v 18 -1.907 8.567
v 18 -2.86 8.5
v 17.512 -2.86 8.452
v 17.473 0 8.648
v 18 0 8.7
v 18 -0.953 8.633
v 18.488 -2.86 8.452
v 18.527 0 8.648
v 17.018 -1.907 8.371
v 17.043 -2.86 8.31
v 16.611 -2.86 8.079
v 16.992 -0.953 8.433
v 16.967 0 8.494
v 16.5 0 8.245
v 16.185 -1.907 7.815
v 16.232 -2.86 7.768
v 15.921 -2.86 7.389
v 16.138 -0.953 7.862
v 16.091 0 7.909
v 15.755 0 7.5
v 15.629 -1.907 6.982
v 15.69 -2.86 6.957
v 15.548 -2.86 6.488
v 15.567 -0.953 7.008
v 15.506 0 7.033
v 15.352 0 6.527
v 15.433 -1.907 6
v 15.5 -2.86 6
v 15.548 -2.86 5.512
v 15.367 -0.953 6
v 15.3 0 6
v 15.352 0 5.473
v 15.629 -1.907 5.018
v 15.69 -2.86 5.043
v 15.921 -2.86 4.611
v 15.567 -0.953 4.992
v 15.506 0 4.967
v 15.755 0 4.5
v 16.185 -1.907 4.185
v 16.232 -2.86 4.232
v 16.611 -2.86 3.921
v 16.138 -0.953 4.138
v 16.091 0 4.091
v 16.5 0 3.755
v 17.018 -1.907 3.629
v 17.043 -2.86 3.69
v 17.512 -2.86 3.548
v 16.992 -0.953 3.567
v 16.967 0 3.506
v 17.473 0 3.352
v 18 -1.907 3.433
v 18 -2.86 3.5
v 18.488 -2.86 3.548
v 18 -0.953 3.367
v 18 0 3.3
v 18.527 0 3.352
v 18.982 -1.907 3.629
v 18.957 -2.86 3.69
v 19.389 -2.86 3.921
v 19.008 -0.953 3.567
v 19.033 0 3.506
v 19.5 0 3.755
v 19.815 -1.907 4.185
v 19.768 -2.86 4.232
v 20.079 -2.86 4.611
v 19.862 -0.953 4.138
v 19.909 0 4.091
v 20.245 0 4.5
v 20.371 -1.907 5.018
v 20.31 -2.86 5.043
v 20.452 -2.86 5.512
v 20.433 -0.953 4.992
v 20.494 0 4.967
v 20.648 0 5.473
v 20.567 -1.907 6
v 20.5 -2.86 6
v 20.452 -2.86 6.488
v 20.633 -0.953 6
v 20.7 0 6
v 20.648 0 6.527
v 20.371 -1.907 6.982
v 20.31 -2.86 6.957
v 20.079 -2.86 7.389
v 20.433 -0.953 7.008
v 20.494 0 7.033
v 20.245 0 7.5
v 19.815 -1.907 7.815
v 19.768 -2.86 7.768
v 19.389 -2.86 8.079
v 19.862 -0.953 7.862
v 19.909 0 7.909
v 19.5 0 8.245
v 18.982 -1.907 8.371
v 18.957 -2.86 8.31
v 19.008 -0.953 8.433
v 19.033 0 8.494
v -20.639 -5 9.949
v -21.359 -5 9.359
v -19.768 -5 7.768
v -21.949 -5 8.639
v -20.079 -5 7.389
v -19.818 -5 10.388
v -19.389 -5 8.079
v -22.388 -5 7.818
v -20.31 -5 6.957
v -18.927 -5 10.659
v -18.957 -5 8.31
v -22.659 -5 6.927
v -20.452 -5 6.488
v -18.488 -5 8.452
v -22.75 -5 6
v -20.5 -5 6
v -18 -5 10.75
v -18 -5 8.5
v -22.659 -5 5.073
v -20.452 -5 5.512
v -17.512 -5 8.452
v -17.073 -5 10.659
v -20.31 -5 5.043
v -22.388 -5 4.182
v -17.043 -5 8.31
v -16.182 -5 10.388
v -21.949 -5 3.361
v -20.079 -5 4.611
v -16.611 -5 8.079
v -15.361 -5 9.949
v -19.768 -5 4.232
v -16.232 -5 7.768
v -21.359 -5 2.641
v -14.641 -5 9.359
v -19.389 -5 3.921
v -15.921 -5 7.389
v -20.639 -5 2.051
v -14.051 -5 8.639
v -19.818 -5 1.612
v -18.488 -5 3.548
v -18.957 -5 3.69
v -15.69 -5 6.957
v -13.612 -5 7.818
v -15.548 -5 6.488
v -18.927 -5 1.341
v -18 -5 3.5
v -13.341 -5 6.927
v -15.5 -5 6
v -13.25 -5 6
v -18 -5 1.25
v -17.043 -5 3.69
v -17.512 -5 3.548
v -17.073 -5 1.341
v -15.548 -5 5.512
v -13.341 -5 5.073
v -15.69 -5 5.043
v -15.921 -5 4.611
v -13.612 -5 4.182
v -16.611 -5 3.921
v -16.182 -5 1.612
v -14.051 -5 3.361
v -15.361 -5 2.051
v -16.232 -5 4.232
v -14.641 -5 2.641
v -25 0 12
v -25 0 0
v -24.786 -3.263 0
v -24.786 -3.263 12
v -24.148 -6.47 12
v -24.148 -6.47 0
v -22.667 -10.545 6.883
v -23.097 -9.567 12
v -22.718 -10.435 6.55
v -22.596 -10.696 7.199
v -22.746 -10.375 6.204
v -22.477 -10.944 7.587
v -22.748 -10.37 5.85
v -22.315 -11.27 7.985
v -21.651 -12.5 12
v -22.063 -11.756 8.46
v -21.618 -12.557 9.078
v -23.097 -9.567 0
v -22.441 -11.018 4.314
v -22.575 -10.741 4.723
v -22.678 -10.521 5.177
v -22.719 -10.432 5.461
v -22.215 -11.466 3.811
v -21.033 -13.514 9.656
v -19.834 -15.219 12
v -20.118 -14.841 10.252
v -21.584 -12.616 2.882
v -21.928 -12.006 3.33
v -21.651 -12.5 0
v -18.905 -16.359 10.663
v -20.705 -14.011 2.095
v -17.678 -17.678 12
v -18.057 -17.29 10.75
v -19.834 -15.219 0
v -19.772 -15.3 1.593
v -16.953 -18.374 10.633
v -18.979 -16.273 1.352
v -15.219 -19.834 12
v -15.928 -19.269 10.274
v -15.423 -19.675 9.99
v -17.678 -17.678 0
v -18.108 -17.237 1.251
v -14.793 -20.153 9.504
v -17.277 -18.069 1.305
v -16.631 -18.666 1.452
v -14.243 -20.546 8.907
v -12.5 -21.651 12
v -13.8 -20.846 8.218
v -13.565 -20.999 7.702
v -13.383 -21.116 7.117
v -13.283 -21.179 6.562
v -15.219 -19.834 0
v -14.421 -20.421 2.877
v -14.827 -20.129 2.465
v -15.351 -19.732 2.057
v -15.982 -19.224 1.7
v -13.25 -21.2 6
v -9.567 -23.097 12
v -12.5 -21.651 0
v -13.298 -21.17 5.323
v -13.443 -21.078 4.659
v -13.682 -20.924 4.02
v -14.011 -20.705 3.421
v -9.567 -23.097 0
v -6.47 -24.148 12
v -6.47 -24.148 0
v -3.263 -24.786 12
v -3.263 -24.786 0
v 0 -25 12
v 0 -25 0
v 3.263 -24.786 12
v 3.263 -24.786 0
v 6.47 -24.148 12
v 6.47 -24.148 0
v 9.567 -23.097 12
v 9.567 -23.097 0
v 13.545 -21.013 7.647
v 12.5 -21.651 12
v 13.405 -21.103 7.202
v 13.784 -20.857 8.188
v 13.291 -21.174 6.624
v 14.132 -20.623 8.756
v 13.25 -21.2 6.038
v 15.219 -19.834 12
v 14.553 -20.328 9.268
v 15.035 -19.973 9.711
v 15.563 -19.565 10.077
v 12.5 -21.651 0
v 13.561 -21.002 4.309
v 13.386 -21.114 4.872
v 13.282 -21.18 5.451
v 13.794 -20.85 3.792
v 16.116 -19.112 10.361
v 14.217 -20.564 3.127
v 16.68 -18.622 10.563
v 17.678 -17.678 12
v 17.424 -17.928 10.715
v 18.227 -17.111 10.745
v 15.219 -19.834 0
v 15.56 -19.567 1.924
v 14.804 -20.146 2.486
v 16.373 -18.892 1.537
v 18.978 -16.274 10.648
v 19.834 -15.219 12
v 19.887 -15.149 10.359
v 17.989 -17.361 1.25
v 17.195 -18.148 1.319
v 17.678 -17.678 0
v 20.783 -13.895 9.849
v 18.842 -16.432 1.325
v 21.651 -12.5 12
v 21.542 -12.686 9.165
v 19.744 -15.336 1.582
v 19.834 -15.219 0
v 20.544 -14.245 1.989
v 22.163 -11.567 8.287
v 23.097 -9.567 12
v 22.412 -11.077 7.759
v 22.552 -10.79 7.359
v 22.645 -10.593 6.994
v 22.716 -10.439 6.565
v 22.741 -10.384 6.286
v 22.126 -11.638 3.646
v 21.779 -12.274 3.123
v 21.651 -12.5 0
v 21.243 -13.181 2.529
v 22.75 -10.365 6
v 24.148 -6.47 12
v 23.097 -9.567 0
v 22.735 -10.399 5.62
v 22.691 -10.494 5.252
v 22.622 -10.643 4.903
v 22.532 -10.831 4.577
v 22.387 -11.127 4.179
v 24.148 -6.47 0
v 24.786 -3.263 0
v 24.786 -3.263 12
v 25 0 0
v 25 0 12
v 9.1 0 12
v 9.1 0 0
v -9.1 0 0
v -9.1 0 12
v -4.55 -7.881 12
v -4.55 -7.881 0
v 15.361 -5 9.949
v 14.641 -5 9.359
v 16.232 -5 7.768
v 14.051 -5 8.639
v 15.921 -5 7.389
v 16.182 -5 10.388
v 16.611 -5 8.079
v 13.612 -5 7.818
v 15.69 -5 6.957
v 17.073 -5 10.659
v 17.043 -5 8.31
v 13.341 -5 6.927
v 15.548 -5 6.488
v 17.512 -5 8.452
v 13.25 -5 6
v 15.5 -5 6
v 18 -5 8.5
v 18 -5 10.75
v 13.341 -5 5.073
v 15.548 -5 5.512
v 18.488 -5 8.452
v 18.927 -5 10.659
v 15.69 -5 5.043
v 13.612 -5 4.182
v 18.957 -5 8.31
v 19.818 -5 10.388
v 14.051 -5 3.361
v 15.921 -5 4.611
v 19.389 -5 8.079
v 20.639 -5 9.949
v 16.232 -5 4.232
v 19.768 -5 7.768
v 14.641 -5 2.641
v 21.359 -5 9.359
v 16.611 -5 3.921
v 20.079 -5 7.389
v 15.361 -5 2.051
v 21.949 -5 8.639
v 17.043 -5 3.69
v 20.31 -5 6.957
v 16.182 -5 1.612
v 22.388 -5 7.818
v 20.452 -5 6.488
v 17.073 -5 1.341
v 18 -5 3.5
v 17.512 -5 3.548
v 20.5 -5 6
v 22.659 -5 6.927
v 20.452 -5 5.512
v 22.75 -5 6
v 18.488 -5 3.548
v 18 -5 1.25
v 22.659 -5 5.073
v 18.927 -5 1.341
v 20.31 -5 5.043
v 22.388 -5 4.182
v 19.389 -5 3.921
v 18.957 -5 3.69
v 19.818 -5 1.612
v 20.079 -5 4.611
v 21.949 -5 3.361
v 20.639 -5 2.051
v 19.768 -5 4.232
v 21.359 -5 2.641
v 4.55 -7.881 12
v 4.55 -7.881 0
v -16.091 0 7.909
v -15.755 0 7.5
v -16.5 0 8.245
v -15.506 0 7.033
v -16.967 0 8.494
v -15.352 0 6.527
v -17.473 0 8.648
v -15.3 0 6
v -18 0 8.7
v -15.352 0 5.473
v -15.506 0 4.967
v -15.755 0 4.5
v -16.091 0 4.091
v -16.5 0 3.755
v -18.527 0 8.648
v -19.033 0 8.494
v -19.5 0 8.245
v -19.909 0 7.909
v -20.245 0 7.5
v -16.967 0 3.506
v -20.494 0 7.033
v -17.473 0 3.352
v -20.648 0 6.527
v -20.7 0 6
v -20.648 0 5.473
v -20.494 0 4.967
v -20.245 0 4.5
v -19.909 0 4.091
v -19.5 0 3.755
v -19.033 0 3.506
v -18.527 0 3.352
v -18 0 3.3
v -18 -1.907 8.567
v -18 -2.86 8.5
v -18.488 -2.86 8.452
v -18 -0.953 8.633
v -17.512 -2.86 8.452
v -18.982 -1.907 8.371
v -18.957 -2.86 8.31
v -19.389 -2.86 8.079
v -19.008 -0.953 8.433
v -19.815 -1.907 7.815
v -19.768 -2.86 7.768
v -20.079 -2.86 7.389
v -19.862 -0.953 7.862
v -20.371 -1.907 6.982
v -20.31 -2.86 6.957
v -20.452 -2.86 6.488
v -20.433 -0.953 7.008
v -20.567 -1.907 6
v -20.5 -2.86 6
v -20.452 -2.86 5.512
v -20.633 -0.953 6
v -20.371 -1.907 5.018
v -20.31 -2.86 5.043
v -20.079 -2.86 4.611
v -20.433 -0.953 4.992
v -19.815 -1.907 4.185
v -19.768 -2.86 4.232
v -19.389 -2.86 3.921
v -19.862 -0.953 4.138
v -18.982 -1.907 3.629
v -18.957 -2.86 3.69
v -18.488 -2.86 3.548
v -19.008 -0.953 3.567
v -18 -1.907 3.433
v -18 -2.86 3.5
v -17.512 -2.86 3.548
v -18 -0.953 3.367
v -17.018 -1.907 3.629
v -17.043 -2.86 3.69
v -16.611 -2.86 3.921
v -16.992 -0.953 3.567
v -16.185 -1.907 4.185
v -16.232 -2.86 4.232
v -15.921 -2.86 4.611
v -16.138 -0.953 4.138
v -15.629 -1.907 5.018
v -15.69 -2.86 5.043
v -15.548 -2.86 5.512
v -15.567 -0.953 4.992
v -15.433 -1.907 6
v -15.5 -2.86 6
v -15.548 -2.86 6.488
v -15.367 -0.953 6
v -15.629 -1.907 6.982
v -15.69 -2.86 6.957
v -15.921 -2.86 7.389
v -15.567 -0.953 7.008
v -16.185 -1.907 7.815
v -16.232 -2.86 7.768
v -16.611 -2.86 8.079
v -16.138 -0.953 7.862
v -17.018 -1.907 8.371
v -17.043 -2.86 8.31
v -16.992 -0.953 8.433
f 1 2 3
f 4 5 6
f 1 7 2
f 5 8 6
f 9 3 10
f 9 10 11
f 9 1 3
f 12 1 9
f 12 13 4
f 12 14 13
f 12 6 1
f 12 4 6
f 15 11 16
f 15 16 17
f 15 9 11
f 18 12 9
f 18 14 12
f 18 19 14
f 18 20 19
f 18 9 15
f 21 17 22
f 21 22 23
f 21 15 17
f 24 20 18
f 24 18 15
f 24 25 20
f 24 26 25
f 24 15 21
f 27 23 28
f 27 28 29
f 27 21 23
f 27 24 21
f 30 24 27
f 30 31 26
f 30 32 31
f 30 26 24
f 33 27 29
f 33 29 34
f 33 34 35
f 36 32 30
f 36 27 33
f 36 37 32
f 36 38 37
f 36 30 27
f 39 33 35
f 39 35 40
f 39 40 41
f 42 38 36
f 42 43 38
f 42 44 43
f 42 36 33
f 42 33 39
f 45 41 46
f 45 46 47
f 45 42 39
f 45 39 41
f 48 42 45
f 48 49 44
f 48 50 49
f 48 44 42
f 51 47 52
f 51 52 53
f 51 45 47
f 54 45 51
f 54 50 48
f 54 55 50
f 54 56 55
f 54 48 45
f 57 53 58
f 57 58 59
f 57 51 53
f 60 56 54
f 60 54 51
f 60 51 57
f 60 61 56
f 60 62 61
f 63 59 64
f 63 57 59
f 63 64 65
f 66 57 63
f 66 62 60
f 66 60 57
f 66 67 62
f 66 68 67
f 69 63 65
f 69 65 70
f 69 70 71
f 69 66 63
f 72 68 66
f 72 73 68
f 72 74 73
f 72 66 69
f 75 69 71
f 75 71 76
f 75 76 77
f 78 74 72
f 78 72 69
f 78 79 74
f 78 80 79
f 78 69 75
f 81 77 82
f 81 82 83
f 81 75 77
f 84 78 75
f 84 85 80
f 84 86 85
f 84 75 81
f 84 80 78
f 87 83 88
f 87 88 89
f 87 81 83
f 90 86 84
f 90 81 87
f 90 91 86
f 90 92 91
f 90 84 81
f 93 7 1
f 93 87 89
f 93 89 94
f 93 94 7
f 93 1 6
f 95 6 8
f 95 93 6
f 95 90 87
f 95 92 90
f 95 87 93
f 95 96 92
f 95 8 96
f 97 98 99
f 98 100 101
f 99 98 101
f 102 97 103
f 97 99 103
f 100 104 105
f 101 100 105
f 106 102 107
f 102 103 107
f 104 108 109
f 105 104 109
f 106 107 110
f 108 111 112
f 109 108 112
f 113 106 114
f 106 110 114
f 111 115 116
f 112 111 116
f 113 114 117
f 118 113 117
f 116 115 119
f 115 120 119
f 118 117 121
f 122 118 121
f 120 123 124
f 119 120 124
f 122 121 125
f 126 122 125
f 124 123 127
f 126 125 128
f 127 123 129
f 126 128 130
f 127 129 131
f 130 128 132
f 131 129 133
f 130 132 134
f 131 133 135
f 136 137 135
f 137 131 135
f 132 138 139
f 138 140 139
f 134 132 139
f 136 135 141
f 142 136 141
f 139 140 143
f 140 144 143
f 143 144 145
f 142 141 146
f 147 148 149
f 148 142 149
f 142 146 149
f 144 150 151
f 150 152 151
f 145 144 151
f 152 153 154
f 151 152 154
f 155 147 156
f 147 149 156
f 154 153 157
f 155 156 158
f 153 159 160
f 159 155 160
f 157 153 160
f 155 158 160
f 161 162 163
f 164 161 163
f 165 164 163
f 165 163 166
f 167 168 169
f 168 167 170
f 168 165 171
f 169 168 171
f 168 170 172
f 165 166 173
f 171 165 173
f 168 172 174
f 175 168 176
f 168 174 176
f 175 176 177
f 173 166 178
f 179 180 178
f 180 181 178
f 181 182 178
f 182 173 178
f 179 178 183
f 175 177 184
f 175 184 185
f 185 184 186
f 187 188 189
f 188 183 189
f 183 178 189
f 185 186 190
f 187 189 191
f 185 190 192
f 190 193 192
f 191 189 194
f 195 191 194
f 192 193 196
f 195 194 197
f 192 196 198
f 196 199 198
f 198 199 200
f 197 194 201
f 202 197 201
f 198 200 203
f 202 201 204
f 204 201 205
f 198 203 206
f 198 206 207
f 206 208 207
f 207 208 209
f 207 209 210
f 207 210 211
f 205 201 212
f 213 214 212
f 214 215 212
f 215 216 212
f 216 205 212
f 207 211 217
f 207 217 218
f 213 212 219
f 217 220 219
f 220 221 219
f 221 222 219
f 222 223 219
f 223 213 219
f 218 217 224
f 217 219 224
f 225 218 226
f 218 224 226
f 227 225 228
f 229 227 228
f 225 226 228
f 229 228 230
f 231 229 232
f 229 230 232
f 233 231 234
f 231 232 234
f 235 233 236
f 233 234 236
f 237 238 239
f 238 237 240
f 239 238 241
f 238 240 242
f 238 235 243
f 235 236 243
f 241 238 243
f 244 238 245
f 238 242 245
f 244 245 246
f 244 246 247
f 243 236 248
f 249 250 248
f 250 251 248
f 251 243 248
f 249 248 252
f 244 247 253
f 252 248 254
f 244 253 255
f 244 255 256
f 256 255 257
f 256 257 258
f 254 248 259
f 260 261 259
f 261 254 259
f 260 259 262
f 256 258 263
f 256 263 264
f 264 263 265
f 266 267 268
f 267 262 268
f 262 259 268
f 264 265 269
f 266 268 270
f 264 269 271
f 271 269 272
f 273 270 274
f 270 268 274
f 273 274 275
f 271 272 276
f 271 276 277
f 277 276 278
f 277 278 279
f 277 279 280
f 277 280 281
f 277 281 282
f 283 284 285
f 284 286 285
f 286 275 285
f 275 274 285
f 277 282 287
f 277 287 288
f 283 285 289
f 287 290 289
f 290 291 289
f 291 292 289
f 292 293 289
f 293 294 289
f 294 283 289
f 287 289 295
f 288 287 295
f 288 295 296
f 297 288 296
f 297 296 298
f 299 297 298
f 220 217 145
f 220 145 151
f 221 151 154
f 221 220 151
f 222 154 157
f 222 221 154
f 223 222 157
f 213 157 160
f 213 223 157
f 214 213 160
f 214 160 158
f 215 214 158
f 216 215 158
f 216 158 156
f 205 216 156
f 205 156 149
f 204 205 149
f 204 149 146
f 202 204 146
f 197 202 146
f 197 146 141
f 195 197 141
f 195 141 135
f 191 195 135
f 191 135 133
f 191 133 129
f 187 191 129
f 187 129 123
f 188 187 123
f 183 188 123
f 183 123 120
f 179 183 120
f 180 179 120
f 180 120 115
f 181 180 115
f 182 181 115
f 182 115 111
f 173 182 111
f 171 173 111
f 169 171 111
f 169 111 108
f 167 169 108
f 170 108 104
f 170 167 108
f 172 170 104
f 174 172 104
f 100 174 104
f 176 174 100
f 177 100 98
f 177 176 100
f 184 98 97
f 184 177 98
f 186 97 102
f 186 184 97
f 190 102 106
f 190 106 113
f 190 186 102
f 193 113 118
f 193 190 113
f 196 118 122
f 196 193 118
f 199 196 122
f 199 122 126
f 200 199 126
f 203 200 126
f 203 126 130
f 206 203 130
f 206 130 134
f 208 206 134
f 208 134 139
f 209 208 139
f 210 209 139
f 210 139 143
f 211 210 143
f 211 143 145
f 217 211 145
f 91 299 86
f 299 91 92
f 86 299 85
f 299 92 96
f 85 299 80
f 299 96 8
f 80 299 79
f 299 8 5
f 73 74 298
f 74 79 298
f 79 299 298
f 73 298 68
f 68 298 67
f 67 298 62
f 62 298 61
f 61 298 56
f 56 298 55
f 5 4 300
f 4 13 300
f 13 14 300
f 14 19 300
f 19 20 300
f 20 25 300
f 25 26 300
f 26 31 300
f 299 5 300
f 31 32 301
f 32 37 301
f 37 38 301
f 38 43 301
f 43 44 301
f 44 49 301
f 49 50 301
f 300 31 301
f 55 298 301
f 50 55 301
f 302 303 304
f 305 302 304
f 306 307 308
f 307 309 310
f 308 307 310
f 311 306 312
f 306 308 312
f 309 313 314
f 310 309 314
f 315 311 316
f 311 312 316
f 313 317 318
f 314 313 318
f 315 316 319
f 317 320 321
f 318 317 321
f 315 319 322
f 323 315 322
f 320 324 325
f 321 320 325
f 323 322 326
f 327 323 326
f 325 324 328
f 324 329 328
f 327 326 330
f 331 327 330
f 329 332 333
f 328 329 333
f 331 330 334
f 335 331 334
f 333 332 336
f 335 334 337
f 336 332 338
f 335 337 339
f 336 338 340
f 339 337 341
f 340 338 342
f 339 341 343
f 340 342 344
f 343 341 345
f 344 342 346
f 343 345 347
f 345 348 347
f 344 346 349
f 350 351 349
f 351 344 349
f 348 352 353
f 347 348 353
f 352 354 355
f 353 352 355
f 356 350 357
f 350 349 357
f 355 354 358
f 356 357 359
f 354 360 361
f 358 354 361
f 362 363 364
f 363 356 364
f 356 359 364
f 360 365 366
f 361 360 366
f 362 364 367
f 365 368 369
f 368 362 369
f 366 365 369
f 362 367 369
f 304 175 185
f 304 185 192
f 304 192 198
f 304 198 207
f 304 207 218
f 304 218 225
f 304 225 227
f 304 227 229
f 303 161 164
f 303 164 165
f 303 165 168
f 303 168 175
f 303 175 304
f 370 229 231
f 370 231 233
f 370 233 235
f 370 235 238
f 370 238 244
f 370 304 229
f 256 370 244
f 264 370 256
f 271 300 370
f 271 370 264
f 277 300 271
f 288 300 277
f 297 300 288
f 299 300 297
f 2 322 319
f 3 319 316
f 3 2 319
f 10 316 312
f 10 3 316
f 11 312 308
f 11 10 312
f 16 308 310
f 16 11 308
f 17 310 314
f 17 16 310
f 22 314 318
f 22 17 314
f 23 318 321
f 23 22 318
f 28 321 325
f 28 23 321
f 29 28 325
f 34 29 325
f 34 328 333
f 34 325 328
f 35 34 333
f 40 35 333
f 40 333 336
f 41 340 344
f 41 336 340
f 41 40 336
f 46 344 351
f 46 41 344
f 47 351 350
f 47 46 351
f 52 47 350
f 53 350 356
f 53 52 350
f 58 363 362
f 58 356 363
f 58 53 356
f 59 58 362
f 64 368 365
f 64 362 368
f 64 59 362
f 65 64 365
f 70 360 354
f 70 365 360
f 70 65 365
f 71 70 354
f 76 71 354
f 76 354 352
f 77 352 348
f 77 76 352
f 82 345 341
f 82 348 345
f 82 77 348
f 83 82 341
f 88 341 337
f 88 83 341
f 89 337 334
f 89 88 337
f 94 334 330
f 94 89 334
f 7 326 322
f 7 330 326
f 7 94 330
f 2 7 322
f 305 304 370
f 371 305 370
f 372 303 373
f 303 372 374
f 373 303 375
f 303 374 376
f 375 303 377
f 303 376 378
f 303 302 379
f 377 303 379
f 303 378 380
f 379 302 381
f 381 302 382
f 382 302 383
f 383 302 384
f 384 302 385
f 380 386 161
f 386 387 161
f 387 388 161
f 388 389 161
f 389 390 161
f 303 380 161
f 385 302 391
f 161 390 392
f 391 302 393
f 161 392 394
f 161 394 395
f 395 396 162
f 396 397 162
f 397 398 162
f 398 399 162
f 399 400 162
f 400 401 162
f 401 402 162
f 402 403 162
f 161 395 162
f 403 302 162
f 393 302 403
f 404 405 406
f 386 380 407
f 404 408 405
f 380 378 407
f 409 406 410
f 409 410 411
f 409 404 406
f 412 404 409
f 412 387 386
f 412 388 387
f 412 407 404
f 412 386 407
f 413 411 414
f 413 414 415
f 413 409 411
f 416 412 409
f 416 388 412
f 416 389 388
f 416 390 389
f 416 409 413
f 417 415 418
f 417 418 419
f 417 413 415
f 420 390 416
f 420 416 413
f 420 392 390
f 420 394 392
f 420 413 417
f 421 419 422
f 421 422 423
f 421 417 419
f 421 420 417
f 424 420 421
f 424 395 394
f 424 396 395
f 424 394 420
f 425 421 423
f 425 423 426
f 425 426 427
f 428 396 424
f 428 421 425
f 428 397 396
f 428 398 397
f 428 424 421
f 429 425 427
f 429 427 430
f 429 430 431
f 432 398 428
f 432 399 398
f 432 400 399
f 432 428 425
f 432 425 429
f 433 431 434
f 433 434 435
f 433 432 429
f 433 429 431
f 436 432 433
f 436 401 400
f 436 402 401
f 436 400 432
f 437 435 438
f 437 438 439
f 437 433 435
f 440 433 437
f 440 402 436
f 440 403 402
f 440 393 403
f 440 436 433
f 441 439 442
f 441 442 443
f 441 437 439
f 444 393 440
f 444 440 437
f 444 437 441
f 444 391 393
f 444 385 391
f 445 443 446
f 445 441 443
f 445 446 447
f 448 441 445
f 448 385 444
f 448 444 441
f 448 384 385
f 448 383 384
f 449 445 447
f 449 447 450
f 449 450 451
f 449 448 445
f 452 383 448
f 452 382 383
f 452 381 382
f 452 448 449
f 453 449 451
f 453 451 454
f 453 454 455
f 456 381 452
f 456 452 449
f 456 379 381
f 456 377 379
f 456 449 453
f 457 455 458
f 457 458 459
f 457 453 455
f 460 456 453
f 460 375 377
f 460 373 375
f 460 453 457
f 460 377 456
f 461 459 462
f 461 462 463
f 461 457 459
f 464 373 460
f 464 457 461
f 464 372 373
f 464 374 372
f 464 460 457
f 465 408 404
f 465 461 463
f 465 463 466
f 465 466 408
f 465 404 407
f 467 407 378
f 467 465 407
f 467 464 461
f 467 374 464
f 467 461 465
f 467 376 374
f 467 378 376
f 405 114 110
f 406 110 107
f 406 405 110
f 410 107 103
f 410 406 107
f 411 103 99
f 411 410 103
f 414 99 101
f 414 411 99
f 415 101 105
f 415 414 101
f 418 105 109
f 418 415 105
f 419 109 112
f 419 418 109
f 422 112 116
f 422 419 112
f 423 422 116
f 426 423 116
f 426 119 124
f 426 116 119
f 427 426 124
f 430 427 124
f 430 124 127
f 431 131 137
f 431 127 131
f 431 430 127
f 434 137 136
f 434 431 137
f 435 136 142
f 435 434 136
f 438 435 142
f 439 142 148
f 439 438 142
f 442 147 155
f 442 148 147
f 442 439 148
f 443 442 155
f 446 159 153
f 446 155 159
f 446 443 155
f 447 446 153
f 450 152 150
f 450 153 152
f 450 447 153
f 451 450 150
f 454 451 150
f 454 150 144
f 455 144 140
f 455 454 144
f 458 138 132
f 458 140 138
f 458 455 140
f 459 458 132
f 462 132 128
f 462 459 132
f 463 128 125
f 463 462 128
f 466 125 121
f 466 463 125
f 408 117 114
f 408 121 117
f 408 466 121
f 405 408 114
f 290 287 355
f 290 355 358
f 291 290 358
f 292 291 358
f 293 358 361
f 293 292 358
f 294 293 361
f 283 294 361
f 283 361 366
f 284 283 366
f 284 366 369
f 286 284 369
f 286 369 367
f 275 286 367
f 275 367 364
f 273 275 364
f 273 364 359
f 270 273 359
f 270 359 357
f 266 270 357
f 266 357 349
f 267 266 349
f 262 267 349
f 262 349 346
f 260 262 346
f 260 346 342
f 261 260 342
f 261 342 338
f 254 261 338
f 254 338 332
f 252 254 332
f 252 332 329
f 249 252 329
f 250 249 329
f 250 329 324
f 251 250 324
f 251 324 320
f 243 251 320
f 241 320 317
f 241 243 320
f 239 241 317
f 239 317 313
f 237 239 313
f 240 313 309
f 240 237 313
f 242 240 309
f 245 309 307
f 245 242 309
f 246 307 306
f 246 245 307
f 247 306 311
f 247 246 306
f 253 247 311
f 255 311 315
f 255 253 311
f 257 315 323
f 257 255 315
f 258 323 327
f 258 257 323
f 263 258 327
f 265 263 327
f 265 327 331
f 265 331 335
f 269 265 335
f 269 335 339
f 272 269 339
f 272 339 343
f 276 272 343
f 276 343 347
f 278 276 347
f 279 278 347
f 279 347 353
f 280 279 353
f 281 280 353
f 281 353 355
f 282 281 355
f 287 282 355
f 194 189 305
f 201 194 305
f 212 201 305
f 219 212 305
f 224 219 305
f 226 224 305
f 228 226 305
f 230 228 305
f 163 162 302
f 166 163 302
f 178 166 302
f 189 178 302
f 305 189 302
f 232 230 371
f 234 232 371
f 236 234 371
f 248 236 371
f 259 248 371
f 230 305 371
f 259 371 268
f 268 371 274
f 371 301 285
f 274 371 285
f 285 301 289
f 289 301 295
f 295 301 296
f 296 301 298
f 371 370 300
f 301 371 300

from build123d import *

# Parameters (mm, degrees)
BOSS_EXTRUDE1_DEPTH                          = 12
SKETCH2_R                                    = 4.75
CUT_EXTRUDE1_DEPTH                           = 35
SKETCH3_R                                    = 2.05
CUT_EXTRUDE2_DEPTH                           = 35
CUT_EXTRUDE3_DEPTH                           = 20
CSK_FOR_M3_CROSS_COUNTERSUNK_HEAD_SC_2_COUNT = 2
CSK_FOR_M3_CROSS_COUNTERSUNK_HEAD_SC_2_PITCH = 36


with BuildPart() as part:
    # Sketch1 → Boss-Extrude1 (new body)
    with BuildSketch(Plane.XY):
        with BuildLine():
            Line((-9.1, 0), (-25, 0))
            ThreePointArc((-25, 0), (0, -25), (25, 0))
            Line((25, 0), (9.211282306, 0))
            Line((9.211282306, 0), (9.1, 0))
            Line((9.1, 0), (-9.1, 0))
        make_face()
    extrude(amount=BOSS_EXTRUDE1_DEPTH)

    # Sketch2 → Cut-Extrude1 (cut)
    with BuildSketch(Plane(origin=(0, -40, 0), x_dir=(1, 0, 0), z_dir=(0, 1, 0))):
        with Locations((18, -6)):
            Circle(SKETCH2_R)
        with Locations((-18, -6)):
            Circle(SKETCH2_R)
    extrude(amount=CUT_EXTRUDE1_DEPTH, mode=Mode.SUBTRACT)

    # Sketch3 → Cut-Extrude2 (cut)
    with BuildSketch(Plane.XZ.offset(5)):
        with Locations((18, 6)):
            Circle(SKETCH3_R)
        with Locations((-18, 6)):
            Circle(SKETCH3_R)
    extrude(amount=-CUT_EXTRUDE2_DEPTH, mode=Mode.SUBTRACT)

    # Sketch4 → Cut-Extrude3 (cut)
    with BuildSketch(Plane.XY.offset(12)):
        Polygon((9.1, 0), (4.55, 7.880831174), (-4.55, 7.880831174), (-9.1, 0), (-4.55, -7.880831174), (4.55, -7.880831174), align=None)
    extrude(amount=-CUT_EXTRUDE3_DEPTH, mode=Mode.SUBTRACT)

    # Sketch5 → CSK for M3 Cross Countersunk Head Screw1 (revolve, cut)
    with BuildSketch(Plane(origin=(-18, 0, 6), x_dir=(0, 0, 1), z_dir=(1, 0, 0))):
        Polygon((0, 0), (0, 25), (2.5, 25), (2.5, 2.860133251), (2.7, 0), align=None)
    csk_for_m3_cross_countersunk_head_screw1 = revolve(axis=Axis((-18, 6.35, 6), (0, -1, 0)), mode=Mode.SUBTRACT)

    # CSK for M3 Cross Countersunk Head Sc 2: CSK for M3 Cross Countersunk Head Screw1 ×2
    with Locations(*[(i * CSK_FOR_M3_CROSS_COUNTERSUNK_HEAD_SC_2_PITCH, 0, 0) for i in range(1, CSK_FOR_M3_CROSS_COUNTERSUNK_HEAD_SC_2_COUNT)]):
        add(csk_for_m3_cross_countersunk_head_screw1, mode=Mode.SUBTRACT)


solid = part.part
